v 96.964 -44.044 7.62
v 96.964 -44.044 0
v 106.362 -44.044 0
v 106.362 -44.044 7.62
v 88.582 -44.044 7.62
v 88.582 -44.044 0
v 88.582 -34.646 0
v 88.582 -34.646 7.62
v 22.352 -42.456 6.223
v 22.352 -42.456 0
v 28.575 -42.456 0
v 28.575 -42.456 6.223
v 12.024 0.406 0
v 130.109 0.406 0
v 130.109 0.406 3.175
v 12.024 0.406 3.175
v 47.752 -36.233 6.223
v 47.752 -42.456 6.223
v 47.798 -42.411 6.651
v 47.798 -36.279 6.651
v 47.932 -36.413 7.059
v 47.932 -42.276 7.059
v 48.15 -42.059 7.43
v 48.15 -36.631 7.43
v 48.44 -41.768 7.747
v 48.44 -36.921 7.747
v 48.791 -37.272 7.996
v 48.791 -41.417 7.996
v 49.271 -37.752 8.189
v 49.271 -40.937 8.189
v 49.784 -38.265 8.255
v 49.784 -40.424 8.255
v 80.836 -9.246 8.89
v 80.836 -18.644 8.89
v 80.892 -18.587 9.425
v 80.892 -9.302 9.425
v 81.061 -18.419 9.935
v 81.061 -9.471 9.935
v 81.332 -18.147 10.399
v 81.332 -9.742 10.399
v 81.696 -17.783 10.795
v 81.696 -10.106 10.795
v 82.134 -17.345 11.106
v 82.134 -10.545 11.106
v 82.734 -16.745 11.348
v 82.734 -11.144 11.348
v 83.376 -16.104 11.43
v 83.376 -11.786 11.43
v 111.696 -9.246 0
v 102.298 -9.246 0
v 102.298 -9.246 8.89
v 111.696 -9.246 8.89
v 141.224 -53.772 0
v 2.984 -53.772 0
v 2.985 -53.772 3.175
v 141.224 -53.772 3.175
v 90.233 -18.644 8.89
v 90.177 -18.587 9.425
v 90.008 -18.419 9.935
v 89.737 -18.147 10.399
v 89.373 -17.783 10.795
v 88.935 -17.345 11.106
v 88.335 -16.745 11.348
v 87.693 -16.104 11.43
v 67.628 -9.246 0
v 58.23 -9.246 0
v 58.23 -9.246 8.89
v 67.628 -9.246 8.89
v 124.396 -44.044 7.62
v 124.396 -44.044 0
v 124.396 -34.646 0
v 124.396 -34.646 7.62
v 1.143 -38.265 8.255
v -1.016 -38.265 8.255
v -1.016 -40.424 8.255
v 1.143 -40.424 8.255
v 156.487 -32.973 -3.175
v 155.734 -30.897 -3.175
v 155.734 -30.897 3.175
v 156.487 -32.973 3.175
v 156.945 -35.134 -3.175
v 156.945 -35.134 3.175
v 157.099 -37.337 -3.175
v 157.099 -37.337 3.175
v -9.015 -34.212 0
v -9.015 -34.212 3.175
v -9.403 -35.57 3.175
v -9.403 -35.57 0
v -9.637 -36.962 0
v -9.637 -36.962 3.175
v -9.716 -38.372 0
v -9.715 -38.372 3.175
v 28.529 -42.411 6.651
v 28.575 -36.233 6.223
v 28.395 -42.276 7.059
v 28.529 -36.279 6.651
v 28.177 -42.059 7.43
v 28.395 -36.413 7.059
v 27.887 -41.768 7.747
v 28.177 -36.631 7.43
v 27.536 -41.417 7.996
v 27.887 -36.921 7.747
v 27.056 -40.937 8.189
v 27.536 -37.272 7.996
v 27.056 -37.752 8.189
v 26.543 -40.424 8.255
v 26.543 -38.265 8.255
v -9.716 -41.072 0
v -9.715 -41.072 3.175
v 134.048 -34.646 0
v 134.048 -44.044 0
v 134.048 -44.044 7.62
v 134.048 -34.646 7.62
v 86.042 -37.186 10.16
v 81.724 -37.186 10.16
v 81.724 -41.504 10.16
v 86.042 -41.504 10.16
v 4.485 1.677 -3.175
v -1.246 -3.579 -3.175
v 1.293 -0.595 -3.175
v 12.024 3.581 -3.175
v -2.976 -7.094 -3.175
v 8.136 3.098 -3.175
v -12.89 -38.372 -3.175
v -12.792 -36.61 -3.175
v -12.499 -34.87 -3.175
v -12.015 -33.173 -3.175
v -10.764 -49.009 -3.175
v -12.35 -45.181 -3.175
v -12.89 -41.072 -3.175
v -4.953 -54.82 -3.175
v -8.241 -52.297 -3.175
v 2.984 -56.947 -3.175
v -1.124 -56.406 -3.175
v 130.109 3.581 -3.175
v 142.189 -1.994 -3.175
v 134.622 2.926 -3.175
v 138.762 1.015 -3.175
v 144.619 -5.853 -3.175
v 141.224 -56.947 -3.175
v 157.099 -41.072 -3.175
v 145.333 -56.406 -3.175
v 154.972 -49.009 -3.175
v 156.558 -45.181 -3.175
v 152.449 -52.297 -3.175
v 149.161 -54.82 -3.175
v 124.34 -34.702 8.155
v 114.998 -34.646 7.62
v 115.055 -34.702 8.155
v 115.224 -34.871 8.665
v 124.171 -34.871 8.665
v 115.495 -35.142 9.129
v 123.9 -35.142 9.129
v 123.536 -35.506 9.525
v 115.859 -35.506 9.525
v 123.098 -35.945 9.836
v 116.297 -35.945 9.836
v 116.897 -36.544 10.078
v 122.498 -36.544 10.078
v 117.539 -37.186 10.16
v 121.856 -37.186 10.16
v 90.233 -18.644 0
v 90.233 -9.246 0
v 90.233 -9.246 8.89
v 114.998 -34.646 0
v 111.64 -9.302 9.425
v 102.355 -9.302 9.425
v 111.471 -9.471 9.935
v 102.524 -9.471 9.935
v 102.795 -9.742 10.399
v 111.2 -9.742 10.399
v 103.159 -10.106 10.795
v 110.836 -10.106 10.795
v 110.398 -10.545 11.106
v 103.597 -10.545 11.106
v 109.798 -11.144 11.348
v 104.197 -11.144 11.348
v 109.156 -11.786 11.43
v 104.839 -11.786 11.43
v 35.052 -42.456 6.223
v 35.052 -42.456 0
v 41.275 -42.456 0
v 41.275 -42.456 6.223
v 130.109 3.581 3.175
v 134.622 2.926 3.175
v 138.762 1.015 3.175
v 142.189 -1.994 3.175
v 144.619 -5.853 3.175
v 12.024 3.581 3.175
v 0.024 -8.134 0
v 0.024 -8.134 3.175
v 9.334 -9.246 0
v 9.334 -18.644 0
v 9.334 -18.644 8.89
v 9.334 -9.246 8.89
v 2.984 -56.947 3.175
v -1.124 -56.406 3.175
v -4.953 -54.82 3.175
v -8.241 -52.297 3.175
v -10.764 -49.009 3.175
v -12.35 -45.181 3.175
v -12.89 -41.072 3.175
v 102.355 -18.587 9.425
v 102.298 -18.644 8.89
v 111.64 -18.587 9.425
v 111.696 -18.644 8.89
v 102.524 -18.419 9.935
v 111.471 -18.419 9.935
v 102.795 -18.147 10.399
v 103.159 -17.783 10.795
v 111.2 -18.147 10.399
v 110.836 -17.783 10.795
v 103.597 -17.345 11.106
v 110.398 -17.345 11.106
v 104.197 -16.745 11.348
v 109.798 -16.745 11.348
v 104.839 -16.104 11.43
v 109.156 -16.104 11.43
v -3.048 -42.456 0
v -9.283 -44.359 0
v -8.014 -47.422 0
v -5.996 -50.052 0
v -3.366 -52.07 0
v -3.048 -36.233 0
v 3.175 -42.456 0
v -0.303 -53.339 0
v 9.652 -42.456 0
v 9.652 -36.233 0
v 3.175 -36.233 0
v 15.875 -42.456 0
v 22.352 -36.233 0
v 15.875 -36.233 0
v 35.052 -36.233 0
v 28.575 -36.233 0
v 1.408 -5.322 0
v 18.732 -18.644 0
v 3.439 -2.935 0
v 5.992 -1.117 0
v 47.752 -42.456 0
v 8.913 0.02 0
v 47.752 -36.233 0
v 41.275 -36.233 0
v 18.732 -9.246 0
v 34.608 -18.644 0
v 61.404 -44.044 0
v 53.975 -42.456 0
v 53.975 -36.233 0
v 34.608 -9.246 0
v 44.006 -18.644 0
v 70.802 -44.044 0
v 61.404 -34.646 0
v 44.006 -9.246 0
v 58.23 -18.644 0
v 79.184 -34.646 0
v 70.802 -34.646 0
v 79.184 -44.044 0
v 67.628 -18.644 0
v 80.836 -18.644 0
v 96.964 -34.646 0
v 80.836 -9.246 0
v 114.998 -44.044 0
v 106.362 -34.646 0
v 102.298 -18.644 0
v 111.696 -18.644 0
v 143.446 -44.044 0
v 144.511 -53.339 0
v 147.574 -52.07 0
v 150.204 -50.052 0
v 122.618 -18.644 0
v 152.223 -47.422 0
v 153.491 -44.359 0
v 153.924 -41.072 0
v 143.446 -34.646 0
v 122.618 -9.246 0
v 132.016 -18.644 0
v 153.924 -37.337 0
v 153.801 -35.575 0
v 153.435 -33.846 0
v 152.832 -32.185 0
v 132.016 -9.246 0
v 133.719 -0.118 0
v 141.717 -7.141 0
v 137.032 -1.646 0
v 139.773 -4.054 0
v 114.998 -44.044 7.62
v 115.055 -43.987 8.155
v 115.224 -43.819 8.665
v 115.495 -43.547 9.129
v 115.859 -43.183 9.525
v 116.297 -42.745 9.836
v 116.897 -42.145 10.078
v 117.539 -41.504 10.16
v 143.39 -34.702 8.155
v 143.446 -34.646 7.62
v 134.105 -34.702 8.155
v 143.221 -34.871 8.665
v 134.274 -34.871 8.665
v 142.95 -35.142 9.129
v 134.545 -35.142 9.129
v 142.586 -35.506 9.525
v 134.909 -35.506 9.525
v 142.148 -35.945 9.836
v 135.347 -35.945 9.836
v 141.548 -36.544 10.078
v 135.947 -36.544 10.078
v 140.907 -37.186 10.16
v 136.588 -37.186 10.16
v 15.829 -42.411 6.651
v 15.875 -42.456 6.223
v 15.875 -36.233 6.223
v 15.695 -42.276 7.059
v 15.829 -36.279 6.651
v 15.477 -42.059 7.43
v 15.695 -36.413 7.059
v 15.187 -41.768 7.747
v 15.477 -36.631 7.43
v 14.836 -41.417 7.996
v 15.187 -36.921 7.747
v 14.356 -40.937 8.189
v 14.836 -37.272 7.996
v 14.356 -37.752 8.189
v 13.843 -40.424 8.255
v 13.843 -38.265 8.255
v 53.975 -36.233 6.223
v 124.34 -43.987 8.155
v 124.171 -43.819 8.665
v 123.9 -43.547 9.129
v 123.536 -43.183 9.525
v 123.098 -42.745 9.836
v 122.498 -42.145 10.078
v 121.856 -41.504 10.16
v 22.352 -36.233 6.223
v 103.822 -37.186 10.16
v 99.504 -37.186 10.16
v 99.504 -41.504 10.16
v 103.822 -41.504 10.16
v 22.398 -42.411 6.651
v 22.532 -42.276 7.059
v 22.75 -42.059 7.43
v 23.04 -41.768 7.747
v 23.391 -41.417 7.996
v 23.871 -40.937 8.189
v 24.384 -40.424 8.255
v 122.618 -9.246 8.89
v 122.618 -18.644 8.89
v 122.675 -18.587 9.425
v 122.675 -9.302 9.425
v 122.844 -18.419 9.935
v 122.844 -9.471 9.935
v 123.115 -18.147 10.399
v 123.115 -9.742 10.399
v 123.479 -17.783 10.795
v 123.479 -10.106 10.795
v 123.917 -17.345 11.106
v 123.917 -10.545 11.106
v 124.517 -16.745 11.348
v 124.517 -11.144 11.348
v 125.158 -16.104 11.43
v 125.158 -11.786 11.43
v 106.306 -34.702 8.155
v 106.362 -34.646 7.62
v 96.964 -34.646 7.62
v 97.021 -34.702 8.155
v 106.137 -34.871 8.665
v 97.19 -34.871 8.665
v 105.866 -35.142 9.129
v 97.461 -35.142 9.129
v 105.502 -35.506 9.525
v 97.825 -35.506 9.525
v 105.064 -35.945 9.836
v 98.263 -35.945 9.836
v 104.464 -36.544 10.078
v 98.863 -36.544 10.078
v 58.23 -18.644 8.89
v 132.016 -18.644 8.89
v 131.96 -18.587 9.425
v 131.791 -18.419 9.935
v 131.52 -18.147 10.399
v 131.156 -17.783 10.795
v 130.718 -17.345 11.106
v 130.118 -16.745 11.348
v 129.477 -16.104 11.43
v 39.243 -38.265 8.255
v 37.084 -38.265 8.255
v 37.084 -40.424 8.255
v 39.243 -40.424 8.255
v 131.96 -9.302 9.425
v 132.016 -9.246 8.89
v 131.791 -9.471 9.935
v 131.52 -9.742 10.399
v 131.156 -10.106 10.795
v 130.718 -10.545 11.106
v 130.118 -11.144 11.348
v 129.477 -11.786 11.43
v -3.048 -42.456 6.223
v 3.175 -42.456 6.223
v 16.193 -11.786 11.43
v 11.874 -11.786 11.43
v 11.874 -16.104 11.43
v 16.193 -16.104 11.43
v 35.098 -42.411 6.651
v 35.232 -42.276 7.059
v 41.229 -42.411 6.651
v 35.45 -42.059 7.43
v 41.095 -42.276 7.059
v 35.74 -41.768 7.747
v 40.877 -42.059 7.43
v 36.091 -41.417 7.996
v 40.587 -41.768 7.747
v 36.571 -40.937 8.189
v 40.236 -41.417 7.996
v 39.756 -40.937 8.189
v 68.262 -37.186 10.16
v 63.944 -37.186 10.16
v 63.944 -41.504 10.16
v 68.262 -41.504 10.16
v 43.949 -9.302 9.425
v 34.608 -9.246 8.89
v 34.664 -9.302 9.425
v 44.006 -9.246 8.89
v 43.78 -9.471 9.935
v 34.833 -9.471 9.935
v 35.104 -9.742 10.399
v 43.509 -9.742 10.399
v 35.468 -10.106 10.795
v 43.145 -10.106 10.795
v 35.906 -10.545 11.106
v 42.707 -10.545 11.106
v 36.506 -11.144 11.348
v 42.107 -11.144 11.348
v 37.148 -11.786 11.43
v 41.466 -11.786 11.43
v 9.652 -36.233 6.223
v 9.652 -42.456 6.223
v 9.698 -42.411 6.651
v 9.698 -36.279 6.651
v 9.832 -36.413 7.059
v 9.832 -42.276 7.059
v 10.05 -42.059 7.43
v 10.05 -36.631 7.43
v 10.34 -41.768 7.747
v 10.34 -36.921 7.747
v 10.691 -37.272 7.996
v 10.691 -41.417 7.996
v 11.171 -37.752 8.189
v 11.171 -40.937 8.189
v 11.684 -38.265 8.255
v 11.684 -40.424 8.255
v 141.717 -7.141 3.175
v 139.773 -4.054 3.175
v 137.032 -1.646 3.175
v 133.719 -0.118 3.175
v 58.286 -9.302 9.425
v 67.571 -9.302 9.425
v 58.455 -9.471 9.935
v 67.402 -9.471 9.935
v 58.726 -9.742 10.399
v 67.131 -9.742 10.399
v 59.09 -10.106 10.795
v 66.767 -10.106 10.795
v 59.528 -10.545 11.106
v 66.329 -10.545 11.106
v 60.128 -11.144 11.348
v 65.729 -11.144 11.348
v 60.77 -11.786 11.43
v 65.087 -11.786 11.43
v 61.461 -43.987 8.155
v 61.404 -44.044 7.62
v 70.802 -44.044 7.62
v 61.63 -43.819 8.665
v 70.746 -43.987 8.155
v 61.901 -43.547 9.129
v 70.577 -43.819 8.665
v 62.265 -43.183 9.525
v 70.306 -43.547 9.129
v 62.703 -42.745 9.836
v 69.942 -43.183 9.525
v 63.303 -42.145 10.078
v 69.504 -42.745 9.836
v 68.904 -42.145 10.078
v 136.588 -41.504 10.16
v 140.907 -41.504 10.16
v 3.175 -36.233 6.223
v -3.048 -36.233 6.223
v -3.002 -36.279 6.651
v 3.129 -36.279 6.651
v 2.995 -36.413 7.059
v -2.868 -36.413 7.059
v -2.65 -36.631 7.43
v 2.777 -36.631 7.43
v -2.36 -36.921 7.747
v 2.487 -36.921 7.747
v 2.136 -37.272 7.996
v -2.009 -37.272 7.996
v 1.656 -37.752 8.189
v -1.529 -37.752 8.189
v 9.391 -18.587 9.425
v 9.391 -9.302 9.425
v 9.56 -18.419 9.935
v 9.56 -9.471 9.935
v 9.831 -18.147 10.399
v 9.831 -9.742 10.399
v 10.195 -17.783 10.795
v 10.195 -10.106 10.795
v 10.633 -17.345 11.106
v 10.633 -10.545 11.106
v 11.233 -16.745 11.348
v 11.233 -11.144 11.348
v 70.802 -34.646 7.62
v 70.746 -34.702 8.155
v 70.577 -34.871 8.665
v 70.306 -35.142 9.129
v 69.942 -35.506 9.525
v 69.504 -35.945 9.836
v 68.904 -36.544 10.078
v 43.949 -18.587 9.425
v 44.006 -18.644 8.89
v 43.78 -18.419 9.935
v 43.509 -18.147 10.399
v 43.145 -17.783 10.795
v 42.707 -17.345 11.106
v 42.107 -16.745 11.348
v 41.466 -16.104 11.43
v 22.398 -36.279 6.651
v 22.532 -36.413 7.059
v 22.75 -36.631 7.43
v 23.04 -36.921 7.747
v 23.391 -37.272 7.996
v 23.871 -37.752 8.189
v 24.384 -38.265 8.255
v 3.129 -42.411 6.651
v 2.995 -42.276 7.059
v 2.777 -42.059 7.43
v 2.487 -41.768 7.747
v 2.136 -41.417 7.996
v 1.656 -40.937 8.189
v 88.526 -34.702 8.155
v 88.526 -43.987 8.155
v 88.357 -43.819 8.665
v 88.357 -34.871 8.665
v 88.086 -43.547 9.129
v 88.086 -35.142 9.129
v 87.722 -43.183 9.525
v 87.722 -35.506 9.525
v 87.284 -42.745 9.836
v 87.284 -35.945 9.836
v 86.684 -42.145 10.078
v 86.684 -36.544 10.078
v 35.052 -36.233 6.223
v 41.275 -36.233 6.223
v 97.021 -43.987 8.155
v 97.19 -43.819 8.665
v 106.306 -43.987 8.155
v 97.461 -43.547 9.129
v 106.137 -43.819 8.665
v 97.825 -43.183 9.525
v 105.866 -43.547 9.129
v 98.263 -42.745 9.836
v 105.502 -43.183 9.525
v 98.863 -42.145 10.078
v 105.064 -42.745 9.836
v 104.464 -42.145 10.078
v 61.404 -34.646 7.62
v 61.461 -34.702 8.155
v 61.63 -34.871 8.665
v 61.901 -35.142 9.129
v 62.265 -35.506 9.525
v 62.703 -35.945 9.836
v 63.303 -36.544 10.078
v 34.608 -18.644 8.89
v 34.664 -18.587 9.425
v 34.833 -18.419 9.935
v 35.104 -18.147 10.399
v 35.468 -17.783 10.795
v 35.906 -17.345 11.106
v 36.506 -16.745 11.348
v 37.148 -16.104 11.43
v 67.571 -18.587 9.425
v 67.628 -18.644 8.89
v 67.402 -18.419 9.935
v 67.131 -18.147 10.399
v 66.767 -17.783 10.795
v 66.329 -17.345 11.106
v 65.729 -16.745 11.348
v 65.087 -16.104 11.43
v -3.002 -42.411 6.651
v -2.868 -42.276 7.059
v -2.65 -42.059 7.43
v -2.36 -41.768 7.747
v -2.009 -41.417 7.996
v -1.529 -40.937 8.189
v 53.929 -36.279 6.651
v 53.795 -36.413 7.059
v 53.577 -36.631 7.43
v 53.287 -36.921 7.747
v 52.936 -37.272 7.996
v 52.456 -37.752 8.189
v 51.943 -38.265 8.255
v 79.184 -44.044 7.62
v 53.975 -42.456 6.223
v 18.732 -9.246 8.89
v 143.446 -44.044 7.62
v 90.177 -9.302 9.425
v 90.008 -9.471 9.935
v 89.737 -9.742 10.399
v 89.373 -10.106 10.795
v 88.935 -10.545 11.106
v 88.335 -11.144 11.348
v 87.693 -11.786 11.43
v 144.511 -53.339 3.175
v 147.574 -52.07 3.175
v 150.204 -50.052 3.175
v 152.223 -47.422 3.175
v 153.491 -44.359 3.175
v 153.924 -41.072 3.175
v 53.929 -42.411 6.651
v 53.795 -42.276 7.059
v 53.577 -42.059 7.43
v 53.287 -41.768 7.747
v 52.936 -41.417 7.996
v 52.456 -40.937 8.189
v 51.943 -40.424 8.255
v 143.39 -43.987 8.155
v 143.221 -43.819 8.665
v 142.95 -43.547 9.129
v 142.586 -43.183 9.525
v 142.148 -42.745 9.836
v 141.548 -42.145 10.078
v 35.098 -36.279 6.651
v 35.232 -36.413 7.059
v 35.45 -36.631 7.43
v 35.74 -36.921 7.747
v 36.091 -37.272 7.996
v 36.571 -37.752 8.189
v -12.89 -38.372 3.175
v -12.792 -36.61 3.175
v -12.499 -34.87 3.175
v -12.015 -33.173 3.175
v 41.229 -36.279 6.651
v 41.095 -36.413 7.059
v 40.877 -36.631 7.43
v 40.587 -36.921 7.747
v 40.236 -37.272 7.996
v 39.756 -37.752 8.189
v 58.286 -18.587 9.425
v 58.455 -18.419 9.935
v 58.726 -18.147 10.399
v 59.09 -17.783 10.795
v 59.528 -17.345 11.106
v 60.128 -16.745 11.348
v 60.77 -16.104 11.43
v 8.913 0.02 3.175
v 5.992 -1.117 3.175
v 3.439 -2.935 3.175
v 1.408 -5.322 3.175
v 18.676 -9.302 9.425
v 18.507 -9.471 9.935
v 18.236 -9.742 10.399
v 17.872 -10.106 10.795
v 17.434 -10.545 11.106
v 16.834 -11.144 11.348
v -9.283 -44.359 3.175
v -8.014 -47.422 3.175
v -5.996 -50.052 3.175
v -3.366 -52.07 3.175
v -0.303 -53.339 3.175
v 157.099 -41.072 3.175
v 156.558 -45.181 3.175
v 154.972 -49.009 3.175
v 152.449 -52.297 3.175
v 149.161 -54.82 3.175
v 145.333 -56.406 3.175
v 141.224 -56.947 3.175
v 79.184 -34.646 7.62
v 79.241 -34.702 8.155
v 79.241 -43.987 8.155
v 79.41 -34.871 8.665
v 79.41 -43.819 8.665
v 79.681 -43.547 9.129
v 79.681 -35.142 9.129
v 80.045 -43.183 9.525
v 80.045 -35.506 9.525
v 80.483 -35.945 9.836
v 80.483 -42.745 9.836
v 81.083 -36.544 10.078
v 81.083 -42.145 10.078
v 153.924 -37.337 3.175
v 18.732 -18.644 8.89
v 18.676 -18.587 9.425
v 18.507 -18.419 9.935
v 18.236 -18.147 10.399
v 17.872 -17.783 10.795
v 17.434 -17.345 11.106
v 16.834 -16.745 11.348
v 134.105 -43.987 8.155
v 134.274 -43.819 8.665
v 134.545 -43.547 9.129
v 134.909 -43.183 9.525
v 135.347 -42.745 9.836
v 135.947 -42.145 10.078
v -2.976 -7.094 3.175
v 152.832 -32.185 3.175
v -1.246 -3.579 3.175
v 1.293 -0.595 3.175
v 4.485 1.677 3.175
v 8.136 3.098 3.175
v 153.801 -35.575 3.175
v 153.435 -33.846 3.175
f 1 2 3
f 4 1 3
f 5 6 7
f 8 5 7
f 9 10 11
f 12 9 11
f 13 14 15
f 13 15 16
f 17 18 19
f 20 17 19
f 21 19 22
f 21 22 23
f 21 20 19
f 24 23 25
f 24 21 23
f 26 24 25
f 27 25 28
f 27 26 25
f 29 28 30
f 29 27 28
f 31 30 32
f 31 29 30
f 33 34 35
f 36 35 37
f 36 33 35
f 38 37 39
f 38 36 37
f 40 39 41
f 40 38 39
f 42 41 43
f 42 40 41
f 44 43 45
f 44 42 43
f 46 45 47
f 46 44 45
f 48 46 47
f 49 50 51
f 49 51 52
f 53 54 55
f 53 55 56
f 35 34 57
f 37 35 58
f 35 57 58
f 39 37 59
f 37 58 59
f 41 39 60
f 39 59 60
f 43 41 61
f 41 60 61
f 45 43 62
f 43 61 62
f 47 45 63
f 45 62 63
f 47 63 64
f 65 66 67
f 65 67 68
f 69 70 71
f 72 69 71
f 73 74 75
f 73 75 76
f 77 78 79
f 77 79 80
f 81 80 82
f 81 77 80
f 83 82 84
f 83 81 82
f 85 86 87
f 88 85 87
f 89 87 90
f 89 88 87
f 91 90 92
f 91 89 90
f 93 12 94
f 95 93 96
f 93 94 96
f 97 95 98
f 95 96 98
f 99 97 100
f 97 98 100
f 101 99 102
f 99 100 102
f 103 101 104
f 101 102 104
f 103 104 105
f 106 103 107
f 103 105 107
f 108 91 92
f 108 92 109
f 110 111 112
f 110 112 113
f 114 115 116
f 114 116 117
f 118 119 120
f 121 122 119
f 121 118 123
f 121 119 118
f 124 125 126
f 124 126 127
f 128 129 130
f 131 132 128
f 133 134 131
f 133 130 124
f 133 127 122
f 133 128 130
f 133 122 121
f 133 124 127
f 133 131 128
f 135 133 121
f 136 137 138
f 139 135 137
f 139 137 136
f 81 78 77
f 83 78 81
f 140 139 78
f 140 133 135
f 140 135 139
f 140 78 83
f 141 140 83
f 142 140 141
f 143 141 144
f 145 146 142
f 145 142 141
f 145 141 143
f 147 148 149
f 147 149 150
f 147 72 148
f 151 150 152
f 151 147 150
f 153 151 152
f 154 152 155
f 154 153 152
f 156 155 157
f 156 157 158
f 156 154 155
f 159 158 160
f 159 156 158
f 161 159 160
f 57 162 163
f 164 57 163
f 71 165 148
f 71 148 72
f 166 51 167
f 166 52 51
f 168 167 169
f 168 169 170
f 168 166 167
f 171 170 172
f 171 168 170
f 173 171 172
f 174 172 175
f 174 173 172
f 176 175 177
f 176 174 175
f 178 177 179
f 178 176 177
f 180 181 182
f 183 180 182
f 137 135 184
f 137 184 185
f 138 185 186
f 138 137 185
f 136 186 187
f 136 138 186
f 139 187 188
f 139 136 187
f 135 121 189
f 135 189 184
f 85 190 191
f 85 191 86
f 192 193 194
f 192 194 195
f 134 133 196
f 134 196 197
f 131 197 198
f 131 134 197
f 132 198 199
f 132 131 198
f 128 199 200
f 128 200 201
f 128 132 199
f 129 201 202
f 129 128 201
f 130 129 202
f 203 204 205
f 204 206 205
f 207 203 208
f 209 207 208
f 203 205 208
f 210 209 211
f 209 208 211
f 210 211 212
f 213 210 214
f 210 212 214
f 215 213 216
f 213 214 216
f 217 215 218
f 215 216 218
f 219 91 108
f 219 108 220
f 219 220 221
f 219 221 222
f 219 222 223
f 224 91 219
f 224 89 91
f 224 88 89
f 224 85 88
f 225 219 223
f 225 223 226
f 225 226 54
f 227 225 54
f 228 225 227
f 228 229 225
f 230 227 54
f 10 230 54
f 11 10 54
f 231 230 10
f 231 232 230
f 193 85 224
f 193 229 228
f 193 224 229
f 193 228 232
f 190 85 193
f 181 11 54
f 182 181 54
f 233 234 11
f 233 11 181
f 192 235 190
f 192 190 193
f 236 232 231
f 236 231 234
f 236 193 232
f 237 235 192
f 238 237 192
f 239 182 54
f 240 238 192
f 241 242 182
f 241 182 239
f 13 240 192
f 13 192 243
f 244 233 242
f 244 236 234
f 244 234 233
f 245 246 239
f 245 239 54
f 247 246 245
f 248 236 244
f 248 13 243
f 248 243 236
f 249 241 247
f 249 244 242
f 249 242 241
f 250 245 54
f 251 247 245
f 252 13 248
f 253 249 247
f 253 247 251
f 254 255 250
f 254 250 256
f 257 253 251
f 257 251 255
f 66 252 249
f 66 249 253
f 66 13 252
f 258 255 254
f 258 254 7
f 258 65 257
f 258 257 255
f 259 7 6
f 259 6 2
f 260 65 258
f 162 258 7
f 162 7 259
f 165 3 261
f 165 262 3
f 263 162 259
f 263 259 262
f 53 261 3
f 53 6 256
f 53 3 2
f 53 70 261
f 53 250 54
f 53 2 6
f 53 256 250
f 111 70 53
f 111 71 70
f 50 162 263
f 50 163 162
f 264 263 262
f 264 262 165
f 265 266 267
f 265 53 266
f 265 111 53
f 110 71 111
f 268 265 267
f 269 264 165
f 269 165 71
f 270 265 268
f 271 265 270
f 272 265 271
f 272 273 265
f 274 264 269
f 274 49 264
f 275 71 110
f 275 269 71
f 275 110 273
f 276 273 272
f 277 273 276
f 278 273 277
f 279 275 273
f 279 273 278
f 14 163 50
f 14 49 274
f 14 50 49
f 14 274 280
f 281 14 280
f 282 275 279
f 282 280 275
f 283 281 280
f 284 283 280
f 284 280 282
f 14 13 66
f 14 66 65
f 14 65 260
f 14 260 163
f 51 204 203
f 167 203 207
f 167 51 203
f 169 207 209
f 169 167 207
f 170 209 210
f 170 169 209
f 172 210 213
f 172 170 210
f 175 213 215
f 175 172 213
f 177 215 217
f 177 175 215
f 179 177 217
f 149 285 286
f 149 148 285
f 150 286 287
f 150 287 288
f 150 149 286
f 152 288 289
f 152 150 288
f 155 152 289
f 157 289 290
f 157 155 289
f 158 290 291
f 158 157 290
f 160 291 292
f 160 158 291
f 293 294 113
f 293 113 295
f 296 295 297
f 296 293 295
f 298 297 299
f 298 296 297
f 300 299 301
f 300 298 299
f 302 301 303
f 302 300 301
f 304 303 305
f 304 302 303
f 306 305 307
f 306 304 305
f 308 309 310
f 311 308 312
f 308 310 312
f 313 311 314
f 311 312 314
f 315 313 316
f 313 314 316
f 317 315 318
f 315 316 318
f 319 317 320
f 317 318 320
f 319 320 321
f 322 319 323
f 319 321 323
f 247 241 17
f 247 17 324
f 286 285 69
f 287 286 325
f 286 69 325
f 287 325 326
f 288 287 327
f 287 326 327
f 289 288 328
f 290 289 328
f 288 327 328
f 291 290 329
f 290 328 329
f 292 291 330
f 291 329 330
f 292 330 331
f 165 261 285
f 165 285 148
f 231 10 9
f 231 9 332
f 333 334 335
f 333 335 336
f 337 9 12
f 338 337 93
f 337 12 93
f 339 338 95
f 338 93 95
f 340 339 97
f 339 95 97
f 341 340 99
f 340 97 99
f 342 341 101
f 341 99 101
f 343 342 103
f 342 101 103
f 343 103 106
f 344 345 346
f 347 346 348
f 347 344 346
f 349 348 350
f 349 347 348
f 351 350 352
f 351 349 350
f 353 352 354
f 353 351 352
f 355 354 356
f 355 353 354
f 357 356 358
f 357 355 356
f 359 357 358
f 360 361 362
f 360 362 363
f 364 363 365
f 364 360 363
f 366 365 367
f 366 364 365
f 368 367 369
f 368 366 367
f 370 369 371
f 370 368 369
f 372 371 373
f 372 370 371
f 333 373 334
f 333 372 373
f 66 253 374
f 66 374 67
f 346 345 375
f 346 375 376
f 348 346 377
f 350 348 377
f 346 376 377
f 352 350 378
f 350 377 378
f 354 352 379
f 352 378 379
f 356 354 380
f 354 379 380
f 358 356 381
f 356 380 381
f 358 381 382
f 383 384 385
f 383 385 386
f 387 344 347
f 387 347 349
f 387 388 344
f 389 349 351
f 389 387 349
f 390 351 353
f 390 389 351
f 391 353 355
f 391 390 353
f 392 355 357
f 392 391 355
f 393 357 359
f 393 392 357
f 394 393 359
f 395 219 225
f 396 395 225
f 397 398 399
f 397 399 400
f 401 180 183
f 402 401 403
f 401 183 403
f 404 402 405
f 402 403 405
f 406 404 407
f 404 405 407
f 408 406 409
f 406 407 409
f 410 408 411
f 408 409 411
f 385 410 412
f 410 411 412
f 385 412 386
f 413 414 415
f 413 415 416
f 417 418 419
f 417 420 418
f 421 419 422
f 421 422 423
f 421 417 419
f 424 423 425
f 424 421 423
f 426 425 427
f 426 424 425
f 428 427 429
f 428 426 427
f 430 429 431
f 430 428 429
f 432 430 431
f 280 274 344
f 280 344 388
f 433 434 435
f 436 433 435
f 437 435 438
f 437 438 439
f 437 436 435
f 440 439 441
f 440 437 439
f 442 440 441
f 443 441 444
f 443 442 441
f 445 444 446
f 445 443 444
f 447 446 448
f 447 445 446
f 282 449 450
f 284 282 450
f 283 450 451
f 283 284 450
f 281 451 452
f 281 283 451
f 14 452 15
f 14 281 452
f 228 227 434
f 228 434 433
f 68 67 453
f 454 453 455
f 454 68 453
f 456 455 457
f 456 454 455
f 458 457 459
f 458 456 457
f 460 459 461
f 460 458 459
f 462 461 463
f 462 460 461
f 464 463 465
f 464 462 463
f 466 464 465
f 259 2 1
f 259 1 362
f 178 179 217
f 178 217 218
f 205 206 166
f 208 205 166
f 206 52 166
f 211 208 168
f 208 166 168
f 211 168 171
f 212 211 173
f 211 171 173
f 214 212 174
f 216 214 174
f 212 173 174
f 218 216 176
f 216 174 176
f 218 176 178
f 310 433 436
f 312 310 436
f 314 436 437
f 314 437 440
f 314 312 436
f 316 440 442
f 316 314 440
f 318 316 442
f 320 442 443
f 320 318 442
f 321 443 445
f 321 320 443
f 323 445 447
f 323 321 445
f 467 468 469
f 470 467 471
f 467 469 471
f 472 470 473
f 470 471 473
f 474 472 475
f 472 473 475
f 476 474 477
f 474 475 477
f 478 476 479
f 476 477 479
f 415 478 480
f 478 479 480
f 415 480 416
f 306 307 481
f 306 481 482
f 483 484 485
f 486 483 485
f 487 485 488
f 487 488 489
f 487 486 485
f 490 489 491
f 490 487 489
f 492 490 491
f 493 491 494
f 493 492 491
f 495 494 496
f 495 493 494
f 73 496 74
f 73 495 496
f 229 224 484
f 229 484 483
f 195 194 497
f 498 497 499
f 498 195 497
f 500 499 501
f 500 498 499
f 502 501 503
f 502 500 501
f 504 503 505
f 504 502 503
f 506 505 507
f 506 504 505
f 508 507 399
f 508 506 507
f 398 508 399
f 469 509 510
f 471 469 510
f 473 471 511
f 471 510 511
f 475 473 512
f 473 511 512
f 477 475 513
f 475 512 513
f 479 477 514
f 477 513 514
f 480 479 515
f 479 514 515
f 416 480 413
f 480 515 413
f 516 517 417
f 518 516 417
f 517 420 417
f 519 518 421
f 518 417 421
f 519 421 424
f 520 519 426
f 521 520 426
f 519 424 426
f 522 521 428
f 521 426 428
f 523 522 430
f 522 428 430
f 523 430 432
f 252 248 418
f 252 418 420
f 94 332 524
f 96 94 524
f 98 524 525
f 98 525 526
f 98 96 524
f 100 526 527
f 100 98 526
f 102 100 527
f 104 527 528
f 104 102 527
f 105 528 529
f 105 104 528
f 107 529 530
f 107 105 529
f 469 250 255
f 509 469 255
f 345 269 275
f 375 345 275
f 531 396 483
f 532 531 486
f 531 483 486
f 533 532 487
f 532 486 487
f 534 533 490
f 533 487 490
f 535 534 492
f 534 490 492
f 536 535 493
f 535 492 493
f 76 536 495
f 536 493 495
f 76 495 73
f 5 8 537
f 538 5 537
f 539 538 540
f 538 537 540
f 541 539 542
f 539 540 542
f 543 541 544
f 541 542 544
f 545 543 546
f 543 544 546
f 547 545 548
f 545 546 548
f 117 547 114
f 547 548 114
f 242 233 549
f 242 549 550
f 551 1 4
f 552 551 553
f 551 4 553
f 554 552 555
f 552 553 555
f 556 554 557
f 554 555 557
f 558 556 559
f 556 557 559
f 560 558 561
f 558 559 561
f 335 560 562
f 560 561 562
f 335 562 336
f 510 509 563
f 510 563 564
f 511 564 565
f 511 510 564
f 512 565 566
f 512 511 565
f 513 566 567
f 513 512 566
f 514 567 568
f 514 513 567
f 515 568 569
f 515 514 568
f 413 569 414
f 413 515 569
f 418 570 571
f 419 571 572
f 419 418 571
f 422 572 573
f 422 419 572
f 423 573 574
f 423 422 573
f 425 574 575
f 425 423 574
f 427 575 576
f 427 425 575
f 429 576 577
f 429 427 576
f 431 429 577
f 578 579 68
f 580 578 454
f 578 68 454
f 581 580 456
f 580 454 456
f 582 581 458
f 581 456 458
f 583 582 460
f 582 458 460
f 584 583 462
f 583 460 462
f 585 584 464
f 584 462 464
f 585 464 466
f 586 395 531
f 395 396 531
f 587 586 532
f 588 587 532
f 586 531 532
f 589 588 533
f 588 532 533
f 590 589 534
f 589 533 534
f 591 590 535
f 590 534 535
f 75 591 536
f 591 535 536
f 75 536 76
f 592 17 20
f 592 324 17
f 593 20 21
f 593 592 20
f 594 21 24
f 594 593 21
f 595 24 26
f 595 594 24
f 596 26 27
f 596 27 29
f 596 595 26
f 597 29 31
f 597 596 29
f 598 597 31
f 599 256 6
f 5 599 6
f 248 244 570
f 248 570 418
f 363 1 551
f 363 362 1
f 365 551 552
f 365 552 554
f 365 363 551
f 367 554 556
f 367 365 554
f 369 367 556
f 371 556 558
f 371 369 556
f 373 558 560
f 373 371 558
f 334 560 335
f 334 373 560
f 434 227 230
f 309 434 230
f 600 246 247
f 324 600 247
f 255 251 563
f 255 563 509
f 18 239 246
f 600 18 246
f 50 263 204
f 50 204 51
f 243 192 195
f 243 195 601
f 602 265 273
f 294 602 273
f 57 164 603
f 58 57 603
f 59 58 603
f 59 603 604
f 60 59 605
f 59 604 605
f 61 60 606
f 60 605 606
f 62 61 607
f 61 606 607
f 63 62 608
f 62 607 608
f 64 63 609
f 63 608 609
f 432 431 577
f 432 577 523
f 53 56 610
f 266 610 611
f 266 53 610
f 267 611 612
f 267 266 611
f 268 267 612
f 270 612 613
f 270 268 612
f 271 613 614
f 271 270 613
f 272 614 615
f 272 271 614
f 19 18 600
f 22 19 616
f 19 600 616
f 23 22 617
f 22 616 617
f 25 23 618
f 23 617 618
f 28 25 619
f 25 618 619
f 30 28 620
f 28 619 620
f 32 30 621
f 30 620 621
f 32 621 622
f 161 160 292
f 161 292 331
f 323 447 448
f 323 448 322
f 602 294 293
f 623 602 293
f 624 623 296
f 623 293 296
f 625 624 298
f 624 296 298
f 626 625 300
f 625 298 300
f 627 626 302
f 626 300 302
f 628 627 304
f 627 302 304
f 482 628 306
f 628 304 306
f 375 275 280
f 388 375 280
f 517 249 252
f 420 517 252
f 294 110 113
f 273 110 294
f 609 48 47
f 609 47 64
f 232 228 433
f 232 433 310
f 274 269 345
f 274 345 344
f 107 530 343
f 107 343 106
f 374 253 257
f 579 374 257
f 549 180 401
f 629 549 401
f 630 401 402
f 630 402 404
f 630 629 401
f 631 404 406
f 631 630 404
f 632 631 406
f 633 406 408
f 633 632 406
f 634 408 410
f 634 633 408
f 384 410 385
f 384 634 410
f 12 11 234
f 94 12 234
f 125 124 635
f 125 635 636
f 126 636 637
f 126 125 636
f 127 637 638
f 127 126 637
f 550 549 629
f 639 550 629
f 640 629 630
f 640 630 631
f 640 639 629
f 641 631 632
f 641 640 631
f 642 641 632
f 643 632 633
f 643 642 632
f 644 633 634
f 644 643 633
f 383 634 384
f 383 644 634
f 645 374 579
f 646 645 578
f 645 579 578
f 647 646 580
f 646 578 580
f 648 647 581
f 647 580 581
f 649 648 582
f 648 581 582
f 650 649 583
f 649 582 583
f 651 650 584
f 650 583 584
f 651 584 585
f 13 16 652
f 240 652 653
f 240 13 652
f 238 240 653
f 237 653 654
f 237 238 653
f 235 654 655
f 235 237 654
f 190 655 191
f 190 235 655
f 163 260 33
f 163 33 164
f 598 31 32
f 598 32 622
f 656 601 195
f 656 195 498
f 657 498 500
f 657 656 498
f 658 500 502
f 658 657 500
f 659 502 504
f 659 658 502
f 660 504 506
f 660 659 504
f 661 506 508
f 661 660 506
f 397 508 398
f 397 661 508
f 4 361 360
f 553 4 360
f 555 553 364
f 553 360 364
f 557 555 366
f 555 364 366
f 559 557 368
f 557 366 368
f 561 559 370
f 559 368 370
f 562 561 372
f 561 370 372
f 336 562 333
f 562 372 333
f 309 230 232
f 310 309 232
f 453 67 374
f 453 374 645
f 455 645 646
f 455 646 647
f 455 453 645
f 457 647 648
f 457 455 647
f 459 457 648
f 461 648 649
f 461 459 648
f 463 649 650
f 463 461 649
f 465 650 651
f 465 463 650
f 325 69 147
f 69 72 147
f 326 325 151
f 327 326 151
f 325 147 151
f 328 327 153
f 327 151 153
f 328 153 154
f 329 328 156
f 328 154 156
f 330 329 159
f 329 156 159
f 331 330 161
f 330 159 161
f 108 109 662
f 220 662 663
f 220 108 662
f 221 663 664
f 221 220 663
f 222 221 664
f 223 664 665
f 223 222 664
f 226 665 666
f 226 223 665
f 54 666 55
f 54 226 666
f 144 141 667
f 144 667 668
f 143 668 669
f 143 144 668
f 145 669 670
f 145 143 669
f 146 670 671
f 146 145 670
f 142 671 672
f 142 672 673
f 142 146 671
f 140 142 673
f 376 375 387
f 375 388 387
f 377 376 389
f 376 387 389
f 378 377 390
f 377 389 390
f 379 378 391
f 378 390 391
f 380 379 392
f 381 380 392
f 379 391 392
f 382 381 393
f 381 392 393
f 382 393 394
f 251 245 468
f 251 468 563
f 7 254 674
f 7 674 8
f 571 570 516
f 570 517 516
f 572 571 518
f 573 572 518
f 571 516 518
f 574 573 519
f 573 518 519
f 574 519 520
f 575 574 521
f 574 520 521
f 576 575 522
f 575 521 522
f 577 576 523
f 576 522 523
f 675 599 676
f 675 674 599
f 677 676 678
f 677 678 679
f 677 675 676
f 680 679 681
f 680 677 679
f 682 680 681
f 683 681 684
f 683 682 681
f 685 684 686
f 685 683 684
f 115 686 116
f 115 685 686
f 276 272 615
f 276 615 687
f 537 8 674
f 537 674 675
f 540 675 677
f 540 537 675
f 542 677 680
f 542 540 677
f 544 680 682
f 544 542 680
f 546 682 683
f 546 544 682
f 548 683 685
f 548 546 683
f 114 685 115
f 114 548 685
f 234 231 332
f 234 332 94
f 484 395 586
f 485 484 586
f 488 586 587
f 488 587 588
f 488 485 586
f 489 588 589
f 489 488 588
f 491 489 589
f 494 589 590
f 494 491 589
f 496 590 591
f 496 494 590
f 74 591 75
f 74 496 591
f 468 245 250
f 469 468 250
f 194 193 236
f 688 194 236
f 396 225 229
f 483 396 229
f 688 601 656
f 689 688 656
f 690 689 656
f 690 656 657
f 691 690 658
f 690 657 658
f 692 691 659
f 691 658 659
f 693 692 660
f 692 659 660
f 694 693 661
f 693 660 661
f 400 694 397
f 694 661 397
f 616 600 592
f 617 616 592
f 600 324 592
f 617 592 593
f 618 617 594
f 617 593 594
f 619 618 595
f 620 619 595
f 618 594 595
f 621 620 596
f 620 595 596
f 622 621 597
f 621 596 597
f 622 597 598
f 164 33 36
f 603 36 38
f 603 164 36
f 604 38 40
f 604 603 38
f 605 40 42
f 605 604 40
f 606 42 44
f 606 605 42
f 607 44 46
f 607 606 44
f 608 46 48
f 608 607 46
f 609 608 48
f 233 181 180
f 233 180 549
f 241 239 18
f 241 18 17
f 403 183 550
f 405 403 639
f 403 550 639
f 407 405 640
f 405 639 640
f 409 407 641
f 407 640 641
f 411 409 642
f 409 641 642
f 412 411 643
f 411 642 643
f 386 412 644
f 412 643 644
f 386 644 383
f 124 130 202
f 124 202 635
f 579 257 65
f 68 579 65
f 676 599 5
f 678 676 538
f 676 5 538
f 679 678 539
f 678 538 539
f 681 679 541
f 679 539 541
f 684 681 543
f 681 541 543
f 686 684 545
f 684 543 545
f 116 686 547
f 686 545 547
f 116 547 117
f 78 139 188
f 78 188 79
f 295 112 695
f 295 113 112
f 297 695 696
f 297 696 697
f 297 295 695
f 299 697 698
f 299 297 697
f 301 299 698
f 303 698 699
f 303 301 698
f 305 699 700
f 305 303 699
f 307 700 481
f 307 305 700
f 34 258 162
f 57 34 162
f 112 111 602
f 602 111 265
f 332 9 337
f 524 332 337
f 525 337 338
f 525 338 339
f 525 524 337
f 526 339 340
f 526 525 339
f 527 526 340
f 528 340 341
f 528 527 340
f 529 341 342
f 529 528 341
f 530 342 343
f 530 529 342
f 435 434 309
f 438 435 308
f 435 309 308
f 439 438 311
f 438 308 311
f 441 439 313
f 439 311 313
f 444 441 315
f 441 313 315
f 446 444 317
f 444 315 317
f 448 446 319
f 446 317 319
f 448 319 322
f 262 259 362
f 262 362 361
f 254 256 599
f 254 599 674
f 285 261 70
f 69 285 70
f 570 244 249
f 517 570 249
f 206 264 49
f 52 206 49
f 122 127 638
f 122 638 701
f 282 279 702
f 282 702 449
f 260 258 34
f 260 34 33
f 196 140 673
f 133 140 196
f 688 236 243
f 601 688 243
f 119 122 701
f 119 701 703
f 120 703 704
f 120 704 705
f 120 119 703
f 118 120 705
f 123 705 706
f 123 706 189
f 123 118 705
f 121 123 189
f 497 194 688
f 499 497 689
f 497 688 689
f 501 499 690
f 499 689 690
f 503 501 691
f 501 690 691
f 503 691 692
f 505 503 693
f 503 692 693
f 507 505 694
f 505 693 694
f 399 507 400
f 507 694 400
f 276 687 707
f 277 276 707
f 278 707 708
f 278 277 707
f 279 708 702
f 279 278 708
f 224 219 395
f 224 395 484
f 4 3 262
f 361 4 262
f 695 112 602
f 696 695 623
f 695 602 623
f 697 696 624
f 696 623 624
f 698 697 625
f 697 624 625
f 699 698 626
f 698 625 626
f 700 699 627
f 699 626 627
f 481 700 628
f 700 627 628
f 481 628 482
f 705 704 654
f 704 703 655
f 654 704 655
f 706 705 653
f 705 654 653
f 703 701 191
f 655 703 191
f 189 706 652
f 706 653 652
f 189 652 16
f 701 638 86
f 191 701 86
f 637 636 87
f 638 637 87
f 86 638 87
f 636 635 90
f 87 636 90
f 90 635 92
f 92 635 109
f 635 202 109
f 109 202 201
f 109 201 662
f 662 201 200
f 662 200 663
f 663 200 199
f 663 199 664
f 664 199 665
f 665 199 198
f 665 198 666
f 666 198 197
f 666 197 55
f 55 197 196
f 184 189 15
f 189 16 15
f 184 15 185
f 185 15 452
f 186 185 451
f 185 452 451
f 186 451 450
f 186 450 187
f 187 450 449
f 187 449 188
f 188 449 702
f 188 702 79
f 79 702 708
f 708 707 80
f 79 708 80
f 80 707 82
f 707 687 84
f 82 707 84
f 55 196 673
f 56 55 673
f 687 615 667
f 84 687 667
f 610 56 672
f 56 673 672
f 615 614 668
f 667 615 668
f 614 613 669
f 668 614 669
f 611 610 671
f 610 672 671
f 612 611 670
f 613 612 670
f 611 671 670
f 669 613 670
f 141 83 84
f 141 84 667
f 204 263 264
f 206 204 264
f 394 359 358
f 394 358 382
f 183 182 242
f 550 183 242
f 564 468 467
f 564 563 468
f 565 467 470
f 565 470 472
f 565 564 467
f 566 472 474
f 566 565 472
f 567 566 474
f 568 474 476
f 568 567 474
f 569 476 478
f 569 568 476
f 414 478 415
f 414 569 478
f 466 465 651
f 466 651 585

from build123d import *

# Parameters (mm, degrees)
F0_W      = 163.6395
F0_H      = 54.1782
F1_DEPTH  = 3.175
F2_W      = 9.398
F2_H      = 9.398
F3_DEPTH  = 11.43
F4_W      = 9.398
F4_H      = 9.398
F5_DEPTH  = 10.16
F6_R      = 2.54
F7_R      = 2.54
F8_W      = 6.223
F8_H      = 6.223
F9_DEPTH  = 8.255
F10_R     = 2.032
F12_DEPTH = 25.4
F13_R     = 12.7
F15_DEPTH = 6.35


# Not quite as in the source:
# - a feature names something its author has since deleted; it is built from what else it names


with BuildPart() as f1:
    # F0 (on Top) → F1 (new body)
    with BuildSketch(Plane.XY):
        with Locations((72.10425, -26.6827)):
            Rectangle(F0_W, F0_H)
    extrude(amount=-F1_DEPTH)

    # F2 (on Top) → F3 (join)
    with BuildSketch(Plane.XY):
        with Locations((14.0335, -13.9446)):
            Rectangle(F2_W, F2_H)
        with Locations((39.3065, -13.9446)):
            Rectangle(F2_W, F2_H)
        with Locations((62.9285, -13.9446)):
            Rectangle(F2_W, F2_H)
        with Locations((85.5345, -13.9446)):
            Rectangle(F2_W, F2_H)
        with Locations((106.9975, -13.9446)):
            Rectangle(F2_W, F2_H)
        with Locations((127.3175, -13.9446)):
            Rectangle(F2_W, F2_H)
    extrude(amount=F3_DEPTH)

    # F4 (on face) → F5 (join)
    with BuildSketch(Plane.XY):
        with Locations((101.6635, -39.3446)):
            Rectangle(F4_W, F4_H)
        with Locations((138.7475, -39.3446)):
            Rectangle(F4_W, F4_H)
        with Locations((119.6975, -39.3446)):
            Rectangle(F4_W, F4_H)
        with Locations((83.8835, -39.3446)):
            Rectangle(F4_W, F4_H)
        with Locations((66.1035, -39.3446)):
            Rectangle(F4_W, F4_H)
    extrude(amount=F5_DEPTH)

    # F6
    f6_edges = [f1.edges().sort_by_distance(p)[0] for p in [
        (14.0335, -9.2456, 11.43),
        (9.3345, -13.9446, 11.43),
        (14.0335, -18.6436, 11.43),
        (18.7325, -13.9446, 11.43),
        (44.0055, -13.9446, 11.43),
        (39.3065, -9.2456, 11.43),
        (34.6075, -13.9446, 11.43),
        (39.3065, -18.6436, 11.43),
        (67.6275, -13.9446, 11.43),
        (62.9285, -9.2456, 11.43),
        (58.2295, -13.9446, 11.43),
        (62.9285, -18.6436, 11.43),
        (90.2335, -13.9446, 11.43),
        (85.5345, -9.2456, 11.43),
        (80.8355, -13.9446, 11.43),
        (85.5345, -18.6436, 11.43),
        (111.6965, -13.9446, 11.43),
        (106.9975, -9.2456, 11.43),
        (102.2985, -13.9446, 11.43),
        (106.9975, -18.6436, 11.43),
        (132.0165, -13.9446, 11.43),
        (127.3175, -9.2456, 11.43),
        (122.6185, -13.9446, 11.43),
        (127.3175, -18.6436, 11.43),
    ]]
    fillet(f6_edges, radius=F6_R)

    # F7
    f7_edges = [f1.edges().sort_by_distance(p)[0] for p in [
        (66.1035, -34.6456, 10.16),
        (61.4045, -39.3446, 10.16),
        (66.1035, -44.0436, 10.16),
        (70.8025, -39.3446, 10.16),
        (83.8835, -34.6456, 10.16),
        (79.1845, -39.3446, 10.16),
        (83.8835, -44.0436, 10.16),
        (88.5825, -39.3446, 10.16),
        (101.6635, -34.6456, 10.16),
        (96.9645, -39.3446, 10.16),
        (101.6635, -44.0436, 10.16),
        (106.3625, -39.3446, 10.16),
        (119.6975, -34.6456, 10.16),
        (114.9985, -39.3446, 10.16),
        (119.6975, -44.0436, 10.16),
        (124.3965, -39.3446, 10.16),
        (138.7475, -34.6456, 10.16),
        (134.0485, -39.3446, 10.16),
        (138.7475, -44.0436, 10.16),
        (143.4465, -39.3446, 10.16),
    ]]
    fillet(f7_edges, radius=F7_R)

    # F8 (on face) → F9 (join)
    with BuildSketch(Plane.XY):
        with Locations((50.8635, -39.3446)):
            Rectangle(F8_W, F8_H)
        with Locations((38.1635, -39.3446)):
            Rectangle(F8_W, F8_H)
        with Locations((25.4635, -39.3446)):
            Rectangle(F8_W, F8_H)
        with Locations((12.7635, -39.3446)):
            Rectangle(F8_W, F8_H)
        with Locations((0.0635, -39.3446)):
            Rectangle(F8_W, F8_H)
    extrude(amount=F9_DEPTH)

    # F10
    f10_edges = [f1.edges().sort_by_distance(p)[0] for p in [
        (50.8635, -36.2331, 8.255),
        (47.752, -39.3446, 8.255),
        (50.8635, -42.4561, 8.255),
        (53.975, -39.3446, 8.255),
        (41.275, -39.3446, 8.255),
        (38.1635, -36.2331, 8.255),
        (35.052, -39.3446, 8.255),
        (38.1635, -42.4561, 8.255),
        (28.575, -39.3446, 8.255),
        (25.4635, -36.2331, 8.255),
        (22.352, -39.3446, 8.255),
        (25.4635, -42.4561, 8.255),
        (15.875, -39.3446, 8.255),
        (12.7635, -36.2331, 8.255),
        (9.652, -39.3446, 8.255),
        (12.7635, -42.4561, 8.255),
        (3.175, -39.3446, 8.255),
        (0.0635, -36.2331, 8.255),
        (-3.048, -39.3446, 8.255),
        (0.0635, -42.4561, 8.255),
    ]]
    fillet(f10_edges, radius=F10_R)

    # F11 (on face) → F12 (cut)
    with BuildSketch(Plane.XY):
        Polygon((-9.7155, -36.2331), (2.9845, 0.4064), (-15.3606878594, 6.279731635), align=None)
        Polygon((160.9365438023, 5.6682056747), (138.3665, 0.4064), (153.924, -34.6456), align=None)
    extrude(amount=-F12_DEPTH, mode=Mode.SUBTRACT)

    # F13
    f13_edges = [f1.edges().sort_by_distance(p)[0] for p in [
        (2.9845, 0.4064, -1.5875),
        (-9.7155, -36.2331, -1.5875),
        (-9.7155, -53.7718, -1.5875),
        (153.924, -53.7718, -1.5875),
        (153.924, -34.6456, -1.5875),
        (138.3665, 0.4064, -1.5875),
    ]]
    fillet(f13_edges, radius=F13_R)

    # F14 (on face) → F15 (join)
    with BuildSketch(Plane(origin=(0, 0, -3.175), x_dir=(1, 0, 0), z_dir=(0, 0, -1))):
        with BuildLine():
            Line((141.224, 56.9468), (2.9845, 56.9468))
            ThreePointArc((2.9845, 56.9468), (-8.2408201513, 52.2971201513), (-12.8905, 41.0718))
            Line((-12.8905, 41.0718), (-12.8905, 38.3717247645))
            ThreePointArc((-12.8905, 38.3717247645), (-12.6700922272, 35.7355595192), (-12.0149891716, 33.172595069))
            Line((-12.0149891716, 33.172595069), (-2.9757778148, 7.0944703045))
            ThreePointArc((-2.9757778148, 7.0944703045), (2.8182933575, -0.6399186418), (12.0237113568, -3.5814))
            Line((12.0237113568, -3.5814), (130.1085556284, -3.5814))
            ThreePointArc((130.1085556284, -3.5814), (138.7624146724, -1.0152823214), (144.6185640244, 5.8534694619))
            Line((144.6185640244, 5.8534694619), (155.734008396, 30.8972461686))
            ThreePointArc((155.734008396, 30.8972461686), (156.754003353, 34.0457781807), (157.099, 37.3373767067))
            Line((157.099, 37.3373767067), (157.099, 41.0718))
            ThreePointArc((157.099, 41.0718), (152.4493201513, 52.2971201513), (141.224, 56.9468))
        make_face()
        with BuildLine():
            Line((152.8320067168, 32.1852722762), (141.7165623452, 7.1414955695))
            ThreePointArc((141.7165623452, 7.1414955695), (137.0316428636, 1.6464941428), (130.1085556284, -0.4064))
            Line((130.1085556284, -0.4064), (12.0237113568, -0.4064))
            ThreePointArc((12.0237113568, -0.4064), (4.6593769574, 1.9467850865), (0.0241200196, 8.1342962436))
            Line((0.0241200196, 8.1342962436), (-9.0150913373, 34.2124210081))
            ThreePointArc((-9.0150913373, 34.2124210081), (-9.5391737818, 36.2627925683), (-9.7155, 38.3717247645))
            Line((-9.7155, 38.3717247645), (-9.7155, 41.0718))
            ThreePointArc((-9.7155, 41.0718), (-5.9957561211, 50.0520561211), (2.9845, 53.7718))
            Line((2.9845, 53.7718), (141.224, 53.7718))
            ThreePointArc((141.224, 53.7718), (150.2042561211, 50.0520561211), (153.924, 41.0718))
            Line((153.924, 41.0718), (153.924, 37.3373767067))
            ThreePointArc((153.924, 37.3373767067), (153.6480026824, 34.7040978859), (152.8320067168, 32.1852722762))
        make_face(mode=Mode.SUBTRACT)
    extrude(amount=-F15_DEPTH)


solid = f1.part
